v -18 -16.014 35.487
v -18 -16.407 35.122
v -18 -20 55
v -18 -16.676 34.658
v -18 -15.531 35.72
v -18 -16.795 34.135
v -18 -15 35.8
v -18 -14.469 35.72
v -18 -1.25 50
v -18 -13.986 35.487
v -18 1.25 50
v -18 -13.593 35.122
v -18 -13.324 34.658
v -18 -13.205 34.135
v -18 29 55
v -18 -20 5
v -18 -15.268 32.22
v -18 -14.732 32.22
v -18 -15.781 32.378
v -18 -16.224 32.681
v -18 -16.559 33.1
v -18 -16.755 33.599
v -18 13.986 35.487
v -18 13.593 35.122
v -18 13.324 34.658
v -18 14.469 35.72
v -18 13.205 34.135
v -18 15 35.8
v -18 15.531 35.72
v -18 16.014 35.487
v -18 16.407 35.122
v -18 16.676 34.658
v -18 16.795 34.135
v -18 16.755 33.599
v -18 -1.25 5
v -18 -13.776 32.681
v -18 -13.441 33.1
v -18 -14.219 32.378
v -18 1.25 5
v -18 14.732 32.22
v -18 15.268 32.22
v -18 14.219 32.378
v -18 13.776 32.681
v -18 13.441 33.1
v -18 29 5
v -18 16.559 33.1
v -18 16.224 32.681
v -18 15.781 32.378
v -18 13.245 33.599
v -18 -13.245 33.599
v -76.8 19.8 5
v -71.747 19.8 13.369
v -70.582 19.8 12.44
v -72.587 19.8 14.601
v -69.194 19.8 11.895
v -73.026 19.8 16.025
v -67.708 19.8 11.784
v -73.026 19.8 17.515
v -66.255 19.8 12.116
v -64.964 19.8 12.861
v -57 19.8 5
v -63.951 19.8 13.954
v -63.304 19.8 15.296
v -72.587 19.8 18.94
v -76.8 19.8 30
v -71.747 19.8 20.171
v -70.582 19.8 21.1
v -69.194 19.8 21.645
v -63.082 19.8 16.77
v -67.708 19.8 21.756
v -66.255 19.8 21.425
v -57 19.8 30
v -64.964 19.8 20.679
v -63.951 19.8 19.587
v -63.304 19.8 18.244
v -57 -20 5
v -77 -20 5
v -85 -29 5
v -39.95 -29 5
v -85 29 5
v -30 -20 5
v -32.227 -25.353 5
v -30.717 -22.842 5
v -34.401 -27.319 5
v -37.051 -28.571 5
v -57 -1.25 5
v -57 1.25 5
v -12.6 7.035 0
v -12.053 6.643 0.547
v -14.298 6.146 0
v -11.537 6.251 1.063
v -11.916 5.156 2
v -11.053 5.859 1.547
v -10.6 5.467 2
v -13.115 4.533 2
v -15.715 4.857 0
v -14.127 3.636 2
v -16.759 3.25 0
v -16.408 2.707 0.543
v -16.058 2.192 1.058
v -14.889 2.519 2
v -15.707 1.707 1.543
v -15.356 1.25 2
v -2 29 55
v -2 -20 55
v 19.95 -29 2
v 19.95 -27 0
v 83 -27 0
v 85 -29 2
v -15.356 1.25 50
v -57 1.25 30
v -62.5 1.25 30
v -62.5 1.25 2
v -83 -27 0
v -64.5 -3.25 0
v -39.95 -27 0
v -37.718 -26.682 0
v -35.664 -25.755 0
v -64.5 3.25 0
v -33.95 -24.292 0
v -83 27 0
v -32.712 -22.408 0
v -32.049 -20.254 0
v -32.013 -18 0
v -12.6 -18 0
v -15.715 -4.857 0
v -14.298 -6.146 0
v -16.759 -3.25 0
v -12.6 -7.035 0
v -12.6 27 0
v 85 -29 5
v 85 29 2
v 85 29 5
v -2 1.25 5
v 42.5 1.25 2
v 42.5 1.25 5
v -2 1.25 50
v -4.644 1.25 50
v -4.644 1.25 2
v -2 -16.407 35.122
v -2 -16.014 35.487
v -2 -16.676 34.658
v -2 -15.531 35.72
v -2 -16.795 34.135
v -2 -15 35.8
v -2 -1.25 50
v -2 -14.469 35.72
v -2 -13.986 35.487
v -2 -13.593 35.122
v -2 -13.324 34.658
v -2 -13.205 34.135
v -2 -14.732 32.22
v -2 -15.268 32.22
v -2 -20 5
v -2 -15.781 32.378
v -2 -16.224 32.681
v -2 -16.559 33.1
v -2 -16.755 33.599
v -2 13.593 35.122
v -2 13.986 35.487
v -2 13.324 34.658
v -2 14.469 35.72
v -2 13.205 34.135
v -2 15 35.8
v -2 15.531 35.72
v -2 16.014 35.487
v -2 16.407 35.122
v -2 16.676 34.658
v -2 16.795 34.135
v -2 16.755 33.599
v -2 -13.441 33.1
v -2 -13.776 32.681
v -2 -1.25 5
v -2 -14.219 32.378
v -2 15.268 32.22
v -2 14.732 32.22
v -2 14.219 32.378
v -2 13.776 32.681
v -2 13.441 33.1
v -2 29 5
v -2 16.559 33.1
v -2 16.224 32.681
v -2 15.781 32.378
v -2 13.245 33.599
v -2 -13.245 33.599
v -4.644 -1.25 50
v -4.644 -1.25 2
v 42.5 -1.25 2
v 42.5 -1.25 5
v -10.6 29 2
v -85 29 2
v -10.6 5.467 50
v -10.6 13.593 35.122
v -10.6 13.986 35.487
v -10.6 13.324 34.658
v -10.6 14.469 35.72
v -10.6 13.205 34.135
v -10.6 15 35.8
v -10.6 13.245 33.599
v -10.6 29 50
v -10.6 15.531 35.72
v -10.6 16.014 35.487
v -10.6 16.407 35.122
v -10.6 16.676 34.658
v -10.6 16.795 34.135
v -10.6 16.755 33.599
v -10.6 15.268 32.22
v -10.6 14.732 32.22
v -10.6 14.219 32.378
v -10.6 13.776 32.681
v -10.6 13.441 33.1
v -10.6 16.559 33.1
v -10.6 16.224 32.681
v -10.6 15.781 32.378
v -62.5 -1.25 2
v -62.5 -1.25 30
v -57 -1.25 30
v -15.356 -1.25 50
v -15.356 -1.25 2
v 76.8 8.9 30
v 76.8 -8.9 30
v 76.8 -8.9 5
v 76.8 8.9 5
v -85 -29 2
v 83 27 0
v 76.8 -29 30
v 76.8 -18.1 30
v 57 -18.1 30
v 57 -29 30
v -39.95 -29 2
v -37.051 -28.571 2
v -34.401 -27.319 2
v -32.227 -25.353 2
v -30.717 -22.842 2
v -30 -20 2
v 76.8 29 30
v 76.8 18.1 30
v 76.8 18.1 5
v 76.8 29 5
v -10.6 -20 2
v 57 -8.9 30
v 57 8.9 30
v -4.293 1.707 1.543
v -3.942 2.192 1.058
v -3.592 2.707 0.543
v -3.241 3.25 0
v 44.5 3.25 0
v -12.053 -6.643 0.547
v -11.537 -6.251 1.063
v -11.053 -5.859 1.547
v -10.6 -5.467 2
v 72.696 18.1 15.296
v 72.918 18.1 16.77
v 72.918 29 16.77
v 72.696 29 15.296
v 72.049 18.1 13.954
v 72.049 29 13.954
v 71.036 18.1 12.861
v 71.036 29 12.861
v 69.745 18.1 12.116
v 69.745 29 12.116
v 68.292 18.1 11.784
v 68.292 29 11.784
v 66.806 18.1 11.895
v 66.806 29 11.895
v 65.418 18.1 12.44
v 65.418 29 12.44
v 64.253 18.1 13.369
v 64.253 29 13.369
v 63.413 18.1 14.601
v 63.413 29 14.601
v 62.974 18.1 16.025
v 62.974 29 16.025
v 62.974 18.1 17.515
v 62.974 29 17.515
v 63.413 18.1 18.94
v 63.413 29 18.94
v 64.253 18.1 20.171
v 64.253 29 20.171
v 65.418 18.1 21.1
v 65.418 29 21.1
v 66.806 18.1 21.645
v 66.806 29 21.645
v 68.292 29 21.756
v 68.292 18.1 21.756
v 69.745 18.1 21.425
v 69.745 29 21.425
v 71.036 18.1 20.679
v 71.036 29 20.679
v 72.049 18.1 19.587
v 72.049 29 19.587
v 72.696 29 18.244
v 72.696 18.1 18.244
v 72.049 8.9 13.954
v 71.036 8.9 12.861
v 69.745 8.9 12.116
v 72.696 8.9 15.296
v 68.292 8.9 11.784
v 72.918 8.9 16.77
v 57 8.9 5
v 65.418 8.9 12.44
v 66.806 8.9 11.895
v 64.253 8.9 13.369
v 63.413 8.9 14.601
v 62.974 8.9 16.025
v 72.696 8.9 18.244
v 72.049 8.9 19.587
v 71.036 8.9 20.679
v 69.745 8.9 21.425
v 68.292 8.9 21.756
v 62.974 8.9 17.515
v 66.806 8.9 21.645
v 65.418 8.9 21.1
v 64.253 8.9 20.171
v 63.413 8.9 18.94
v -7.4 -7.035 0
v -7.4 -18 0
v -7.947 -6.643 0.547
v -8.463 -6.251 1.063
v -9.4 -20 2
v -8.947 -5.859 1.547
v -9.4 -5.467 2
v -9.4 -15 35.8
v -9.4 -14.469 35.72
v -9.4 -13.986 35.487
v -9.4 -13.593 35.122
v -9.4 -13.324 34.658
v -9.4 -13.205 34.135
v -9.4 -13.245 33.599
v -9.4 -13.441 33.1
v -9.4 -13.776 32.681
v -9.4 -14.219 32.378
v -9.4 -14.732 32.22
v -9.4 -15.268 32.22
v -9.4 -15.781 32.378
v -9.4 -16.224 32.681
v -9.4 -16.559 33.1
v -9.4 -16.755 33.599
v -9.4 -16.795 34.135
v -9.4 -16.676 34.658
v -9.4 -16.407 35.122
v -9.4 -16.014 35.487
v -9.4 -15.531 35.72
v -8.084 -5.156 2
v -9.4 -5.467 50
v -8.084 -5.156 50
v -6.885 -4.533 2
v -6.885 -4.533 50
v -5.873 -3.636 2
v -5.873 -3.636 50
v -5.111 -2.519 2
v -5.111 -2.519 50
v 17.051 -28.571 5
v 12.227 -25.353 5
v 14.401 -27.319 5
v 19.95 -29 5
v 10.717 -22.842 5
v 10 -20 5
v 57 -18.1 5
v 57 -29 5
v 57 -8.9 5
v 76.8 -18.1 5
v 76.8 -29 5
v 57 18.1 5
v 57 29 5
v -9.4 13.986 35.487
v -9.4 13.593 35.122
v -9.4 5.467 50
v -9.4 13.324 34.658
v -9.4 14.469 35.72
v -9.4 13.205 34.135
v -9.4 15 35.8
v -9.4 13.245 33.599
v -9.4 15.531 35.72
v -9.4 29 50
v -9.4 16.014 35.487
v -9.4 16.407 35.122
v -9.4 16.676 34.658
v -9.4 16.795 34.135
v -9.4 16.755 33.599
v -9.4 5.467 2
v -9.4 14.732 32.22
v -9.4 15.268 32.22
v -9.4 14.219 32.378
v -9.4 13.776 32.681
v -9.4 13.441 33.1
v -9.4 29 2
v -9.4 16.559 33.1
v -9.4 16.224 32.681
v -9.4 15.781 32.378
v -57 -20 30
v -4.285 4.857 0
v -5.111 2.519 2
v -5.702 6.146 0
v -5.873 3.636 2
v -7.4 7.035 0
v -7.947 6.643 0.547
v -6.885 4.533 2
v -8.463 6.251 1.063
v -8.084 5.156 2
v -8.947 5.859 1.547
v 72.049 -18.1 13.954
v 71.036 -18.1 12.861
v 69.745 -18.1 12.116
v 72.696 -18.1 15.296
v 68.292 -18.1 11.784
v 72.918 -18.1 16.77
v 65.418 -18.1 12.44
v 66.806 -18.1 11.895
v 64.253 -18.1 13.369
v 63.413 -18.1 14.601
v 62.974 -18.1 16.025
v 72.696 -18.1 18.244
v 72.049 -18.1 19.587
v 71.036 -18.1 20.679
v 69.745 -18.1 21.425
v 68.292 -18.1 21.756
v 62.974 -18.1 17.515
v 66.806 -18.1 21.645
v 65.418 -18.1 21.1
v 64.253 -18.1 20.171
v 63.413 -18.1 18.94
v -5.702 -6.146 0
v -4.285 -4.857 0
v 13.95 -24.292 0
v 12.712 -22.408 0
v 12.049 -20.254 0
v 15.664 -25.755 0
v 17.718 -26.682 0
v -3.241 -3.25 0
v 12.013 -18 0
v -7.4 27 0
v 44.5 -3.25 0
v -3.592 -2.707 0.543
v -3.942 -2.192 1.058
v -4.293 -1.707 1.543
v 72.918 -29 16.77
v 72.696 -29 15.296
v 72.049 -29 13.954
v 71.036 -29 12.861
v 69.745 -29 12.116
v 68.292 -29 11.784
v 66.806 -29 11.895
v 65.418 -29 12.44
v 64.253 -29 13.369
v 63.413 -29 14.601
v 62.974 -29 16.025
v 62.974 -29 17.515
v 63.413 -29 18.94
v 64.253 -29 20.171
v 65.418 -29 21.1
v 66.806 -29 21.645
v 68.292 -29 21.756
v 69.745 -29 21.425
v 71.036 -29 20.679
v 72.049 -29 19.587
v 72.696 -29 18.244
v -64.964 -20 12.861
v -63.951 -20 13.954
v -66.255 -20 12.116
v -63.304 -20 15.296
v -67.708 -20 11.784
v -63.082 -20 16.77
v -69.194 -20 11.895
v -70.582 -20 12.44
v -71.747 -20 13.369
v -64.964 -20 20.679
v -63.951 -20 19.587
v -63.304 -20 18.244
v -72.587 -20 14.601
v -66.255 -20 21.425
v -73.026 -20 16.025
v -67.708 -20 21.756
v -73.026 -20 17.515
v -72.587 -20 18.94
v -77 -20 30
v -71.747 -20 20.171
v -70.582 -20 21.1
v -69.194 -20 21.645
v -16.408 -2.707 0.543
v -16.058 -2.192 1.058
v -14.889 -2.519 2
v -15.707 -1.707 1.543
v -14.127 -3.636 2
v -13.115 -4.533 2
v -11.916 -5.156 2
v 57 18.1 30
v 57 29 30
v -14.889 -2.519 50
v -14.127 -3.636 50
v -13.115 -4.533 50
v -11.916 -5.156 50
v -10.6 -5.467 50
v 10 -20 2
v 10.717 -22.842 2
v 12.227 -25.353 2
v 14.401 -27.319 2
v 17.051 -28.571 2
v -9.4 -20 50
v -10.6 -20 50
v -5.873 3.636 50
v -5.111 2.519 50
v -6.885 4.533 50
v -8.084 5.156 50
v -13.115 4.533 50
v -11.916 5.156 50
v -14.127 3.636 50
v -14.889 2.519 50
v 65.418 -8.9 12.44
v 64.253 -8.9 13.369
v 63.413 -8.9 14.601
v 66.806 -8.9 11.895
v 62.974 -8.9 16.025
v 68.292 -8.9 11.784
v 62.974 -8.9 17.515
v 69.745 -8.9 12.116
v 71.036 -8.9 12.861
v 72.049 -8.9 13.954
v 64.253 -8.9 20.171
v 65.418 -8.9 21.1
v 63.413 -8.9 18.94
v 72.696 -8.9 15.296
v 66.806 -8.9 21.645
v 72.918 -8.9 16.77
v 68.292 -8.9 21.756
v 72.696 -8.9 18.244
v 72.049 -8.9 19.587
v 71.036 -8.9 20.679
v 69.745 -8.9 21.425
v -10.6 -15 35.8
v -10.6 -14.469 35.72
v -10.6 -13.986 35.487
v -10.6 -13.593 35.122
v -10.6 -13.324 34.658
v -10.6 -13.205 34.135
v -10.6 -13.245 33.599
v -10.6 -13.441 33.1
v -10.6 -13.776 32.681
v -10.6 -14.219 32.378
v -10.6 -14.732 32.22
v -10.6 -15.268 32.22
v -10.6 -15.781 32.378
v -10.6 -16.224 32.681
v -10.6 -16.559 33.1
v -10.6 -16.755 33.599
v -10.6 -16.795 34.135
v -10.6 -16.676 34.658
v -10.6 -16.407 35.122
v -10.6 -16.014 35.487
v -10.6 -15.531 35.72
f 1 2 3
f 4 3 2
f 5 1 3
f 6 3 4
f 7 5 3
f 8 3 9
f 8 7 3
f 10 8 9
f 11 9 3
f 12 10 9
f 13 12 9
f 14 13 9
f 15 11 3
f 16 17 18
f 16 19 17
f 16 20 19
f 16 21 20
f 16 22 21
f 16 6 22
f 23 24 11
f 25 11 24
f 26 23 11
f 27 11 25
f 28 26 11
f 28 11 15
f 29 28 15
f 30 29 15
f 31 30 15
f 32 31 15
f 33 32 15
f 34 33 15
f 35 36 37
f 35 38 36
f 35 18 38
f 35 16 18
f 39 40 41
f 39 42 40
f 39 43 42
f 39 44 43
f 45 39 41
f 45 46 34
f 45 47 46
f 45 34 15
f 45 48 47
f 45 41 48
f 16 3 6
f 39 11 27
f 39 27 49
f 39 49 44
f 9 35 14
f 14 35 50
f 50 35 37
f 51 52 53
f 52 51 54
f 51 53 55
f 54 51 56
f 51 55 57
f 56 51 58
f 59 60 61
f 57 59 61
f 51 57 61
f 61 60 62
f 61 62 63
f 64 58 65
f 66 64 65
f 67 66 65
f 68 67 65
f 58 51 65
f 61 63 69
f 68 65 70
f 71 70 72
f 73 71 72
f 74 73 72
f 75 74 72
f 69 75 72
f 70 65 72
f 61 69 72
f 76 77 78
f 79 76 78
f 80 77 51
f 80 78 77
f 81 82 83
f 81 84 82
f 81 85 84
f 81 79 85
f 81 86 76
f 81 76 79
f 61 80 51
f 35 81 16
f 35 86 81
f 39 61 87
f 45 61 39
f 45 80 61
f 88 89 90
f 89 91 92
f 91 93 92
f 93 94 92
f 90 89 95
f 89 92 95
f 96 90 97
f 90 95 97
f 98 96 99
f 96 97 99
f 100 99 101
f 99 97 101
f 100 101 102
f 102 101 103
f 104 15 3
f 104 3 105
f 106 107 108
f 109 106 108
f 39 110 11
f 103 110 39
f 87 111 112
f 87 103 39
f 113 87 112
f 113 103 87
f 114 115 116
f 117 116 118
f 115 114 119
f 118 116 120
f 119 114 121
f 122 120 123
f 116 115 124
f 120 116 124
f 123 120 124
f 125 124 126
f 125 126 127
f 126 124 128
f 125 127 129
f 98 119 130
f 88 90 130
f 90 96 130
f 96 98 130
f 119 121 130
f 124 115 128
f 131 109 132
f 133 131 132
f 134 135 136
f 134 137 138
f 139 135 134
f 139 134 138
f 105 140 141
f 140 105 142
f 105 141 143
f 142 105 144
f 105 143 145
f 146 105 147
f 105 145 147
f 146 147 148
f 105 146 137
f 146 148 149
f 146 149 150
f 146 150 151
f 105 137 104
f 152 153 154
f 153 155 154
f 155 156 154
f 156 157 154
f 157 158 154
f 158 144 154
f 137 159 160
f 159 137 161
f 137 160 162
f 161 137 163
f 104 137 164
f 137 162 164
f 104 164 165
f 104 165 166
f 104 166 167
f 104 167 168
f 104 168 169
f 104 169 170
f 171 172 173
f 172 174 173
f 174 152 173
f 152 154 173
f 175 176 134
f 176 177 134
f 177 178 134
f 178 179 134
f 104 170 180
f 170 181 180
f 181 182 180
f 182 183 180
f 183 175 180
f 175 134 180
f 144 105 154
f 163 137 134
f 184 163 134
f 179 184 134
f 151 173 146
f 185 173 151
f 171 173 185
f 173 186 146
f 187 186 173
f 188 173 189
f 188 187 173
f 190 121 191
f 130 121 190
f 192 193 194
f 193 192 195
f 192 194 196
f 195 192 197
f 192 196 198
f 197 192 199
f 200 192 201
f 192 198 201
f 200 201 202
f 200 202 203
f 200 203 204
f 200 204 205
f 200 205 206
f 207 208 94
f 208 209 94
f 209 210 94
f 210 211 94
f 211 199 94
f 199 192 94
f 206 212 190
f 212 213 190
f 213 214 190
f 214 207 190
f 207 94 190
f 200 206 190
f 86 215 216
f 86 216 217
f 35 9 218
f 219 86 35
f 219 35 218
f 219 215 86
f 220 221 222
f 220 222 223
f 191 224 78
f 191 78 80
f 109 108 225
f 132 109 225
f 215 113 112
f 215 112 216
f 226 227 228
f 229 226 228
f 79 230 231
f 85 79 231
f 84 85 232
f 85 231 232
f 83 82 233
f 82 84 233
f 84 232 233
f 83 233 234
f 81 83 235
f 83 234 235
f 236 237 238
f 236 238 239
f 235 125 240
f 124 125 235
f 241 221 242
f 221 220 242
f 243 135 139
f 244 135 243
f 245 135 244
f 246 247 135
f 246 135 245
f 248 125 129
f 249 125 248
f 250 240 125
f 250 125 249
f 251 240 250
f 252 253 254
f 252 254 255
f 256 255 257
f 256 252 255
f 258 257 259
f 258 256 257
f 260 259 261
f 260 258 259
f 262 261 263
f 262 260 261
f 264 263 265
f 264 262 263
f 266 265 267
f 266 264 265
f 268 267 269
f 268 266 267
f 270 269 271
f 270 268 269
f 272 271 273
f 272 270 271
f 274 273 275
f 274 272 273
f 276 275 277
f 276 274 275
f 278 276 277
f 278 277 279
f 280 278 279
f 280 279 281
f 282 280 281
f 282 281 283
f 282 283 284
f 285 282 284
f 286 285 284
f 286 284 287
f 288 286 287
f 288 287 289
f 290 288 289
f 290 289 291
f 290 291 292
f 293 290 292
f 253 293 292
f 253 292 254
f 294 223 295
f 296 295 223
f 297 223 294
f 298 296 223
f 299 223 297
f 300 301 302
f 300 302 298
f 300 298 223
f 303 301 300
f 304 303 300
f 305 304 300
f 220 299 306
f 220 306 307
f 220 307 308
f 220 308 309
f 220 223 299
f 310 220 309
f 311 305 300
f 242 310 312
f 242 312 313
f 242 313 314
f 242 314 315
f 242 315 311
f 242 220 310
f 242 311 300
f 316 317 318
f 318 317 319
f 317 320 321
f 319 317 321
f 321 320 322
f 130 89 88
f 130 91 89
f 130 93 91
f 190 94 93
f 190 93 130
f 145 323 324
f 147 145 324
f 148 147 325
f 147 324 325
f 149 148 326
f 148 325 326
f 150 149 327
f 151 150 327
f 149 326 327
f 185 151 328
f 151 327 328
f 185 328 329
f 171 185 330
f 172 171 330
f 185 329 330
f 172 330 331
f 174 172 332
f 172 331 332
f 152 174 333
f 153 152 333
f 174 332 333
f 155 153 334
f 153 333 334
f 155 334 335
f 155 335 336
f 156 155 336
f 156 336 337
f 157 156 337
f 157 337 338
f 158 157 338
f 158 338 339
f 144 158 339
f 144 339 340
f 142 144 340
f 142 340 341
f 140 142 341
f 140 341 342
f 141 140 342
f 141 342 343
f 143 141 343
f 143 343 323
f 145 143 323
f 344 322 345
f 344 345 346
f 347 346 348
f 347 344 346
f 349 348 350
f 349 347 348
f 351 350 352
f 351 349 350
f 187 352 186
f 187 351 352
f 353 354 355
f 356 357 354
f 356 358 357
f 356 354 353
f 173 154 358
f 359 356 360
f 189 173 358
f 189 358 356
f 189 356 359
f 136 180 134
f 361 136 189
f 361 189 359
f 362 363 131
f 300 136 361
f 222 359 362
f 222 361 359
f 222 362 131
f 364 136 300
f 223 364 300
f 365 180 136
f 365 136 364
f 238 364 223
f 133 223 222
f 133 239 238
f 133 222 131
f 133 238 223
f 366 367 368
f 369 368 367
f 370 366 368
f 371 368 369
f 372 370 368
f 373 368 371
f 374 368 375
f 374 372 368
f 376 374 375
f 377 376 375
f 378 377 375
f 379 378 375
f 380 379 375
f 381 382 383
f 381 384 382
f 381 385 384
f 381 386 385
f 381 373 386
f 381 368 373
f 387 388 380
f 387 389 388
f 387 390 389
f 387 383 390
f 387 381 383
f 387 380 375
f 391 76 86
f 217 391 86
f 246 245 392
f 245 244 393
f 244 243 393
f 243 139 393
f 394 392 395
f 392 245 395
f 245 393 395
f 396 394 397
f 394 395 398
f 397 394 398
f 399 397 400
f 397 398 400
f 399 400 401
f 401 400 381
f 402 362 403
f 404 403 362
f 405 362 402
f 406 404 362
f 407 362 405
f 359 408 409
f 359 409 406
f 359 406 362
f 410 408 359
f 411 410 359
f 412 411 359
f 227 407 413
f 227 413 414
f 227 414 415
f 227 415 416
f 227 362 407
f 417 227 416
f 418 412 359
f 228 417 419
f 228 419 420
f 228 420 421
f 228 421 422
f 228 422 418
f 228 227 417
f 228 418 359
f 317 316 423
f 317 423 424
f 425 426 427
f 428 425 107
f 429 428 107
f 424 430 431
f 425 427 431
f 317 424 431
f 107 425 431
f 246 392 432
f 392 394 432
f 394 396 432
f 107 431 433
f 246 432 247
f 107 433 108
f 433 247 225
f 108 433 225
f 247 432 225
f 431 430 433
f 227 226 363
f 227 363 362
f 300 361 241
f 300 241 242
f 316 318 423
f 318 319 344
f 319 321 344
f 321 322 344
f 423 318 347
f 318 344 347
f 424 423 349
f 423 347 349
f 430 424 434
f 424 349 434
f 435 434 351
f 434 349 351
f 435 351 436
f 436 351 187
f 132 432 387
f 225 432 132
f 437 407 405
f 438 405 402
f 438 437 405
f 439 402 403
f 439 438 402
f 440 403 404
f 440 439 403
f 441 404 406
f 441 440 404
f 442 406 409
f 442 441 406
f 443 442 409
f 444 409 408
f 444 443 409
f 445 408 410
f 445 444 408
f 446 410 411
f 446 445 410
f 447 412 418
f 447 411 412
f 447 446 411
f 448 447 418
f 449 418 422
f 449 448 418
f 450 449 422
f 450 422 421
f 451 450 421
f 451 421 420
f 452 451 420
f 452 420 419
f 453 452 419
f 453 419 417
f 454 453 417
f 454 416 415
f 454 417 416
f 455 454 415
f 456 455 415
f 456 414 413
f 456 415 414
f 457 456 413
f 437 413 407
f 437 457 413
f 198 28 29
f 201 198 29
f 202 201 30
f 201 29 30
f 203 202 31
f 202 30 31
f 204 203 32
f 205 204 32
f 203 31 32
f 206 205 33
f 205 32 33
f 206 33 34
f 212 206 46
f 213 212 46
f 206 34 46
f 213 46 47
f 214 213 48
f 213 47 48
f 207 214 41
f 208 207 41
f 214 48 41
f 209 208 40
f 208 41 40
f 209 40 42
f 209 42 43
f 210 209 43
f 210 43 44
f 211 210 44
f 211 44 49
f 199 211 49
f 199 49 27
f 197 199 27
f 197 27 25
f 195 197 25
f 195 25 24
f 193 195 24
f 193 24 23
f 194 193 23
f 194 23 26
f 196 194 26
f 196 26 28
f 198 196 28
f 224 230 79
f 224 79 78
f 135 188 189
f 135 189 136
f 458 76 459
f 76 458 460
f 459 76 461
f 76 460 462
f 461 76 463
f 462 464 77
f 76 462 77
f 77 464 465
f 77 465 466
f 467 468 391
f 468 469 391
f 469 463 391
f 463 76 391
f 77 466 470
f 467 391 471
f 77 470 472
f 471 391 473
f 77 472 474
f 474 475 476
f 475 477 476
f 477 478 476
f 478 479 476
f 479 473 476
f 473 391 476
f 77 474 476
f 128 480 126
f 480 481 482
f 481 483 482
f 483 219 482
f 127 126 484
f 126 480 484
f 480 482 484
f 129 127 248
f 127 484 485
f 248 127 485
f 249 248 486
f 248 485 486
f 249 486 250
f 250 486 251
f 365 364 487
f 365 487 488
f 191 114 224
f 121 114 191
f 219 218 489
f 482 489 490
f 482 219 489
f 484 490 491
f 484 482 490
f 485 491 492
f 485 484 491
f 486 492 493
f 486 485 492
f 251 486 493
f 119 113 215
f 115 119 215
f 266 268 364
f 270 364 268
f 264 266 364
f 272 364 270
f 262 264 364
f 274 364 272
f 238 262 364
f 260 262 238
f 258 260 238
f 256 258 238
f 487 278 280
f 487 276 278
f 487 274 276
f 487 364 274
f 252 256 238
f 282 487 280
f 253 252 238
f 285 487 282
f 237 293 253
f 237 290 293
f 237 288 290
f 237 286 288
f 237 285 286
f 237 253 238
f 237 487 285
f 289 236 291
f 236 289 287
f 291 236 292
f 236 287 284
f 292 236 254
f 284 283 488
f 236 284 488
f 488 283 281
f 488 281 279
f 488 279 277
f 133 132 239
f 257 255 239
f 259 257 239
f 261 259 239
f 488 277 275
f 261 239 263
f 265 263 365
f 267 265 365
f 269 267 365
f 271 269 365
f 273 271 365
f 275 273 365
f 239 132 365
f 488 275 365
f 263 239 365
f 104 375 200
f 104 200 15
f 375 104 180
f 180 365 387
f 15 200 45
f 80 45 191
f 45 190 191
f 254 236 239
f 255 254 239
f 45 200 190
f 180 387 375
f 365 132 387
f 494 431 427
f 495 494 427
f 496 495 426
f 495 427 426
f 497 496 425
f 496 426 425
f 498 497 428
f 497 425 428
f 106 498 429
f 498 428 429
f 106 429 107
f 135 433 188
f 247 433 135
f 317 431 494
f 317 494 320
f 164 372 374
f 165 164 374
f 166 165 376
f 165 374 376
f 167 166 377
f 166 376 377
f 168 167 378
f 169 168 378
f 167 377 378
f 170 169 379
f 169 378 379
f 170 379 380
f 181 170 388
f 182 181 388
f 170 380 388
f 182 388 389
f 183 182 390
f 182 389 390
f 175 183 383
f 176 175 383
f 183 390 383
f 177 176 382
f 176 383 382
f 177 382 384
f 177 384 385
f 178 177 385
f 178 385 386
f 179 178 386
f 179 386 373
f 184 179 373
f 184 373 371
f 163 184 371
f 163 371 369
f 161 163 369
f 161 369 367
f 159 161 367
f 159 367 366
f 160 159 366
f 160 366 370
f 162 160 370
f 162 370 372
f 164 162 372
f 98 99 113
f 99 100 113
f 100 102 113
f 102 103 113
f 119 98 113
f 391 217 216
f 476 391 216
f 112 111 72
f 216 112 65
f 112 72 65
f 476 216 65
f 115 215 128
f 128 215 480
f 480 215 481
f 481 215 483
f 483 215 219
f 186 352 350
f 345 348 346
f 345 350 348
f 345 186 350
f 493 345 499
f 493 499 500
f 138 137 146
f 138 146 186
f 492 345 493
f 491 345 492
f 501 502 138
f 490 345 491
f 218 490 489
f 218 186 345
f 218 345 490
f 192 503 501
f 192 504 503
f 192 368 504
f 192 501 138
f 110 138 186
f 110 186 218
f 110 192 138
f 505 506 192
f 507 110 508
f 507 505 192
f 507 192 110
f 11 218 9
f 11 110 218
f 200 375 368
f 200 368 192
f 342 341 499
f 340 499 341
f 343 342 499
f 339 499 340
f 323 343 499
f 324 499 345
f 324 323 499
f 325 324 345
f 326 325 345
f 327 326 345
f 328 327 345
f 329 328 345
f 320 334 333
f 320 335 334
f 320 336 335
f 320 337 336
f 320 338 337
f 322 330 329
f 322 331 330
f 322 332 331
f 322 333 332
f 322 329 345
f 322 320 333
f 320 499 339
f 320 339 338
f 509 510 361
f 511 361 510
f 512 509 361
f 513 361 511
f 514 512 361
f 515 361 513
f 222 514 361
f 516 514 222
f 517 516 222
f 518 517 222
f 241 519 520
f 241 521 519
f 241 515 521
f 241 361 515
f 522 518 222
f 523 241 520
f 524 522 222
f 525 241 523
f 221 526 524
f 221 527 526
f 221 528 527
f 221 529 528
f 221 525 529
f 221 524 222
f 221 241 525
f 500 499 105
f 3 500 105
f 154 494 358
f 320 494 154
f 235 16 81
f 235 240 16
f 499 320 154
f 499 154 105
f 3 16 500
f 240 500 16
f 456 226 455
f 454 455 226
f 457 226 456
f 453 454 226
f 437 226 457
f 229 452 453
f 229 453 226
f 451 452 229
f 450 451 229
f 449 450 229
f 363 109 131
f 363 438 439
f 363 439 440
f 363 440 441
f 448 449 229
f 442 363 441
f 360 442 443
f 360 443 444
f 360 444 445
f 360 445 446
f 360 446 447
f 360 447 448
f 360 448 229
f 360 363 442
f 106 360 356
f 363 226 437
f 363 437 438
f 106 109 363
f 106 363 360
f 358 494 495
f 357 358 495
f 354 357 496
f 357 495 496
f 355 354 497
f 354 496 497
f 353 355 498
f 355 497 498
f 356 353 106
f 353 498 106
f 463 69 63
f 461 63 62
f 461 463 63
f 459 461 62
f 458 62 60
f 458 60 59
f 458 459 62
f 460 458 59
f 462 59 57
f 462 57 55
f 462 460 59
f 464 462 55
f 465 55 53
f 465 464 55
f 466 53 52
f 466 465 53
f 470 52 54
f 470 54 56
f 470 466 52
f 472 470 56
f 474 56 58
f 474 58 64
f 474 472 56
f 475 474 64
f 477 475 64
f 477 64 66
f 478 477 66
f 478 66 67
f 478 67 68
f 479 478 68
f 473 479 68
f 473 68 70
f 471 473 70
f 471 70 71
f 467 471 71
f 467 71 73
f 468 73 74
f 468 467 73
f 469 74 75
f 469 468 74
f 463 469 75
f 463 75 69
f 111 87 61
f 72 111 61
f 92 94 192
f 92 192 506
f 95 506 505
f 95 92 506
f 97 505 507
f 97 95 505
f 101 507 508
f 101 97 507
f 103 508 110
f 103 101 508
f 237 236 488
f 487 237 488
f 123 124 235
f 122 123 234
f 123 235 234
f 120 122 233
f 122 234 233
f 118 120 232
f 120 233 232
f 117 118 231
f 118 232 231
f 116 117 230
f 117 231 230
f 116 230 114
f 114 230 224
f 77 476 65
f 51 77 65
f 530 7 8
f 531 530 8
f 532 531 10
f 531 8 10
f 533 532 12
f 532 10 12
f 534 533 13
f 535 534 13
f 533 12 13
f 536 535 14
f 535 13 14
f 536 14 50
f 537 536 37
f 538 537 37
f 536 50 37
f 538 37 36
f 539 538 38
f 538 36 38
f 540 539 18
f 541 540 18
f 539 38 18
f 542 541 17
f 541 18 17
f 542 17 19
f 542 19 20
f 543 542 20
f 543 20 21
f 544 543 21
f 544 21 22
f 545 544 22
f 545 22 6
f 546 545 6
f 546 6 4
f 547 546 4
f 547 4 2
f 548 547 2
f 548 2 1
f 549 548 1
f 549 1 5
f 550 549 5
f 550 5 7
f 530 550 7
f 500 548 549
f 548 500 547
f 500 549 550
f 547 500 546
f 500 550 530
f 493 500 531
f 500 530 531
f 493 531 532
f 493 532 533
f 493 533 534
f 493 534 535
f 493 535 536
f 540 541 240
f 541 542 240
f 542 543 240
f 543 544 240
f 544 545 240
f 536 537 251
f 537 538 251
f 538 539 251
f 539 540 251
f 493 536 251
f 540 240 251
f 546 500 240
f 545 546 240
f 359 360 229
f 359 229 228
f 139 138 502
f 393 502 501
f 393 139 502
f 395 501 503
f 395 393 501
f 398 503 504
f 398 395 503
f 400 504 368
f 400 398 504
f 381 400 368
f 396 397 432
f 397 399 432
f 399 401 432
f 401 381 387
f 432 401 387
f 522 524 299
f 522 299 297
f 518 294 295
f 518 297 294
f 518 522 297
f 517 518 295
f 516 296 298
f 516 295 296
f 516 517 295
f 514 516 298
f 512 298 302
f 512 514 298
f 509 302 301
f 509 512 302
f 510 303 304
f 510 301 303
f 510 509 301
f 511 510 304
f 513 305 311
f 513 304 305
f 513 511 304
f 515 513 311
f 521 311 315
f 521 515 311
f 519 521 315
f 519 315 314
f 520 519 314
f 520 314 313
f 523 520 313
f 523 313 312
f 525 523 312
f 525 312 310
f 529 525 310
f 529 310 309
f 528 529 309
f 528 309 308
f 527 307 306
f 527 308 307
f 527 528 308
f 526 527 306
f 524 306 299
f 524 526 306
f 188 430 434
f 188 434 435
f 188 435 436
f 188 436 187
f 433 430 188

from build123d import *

# Parameters (mm, degrees)
SKETCH1_W           = 170
SKETCH1_H           = 58
BOSS_EXTRUDE1_DEPTH = 5
SKETCH2_W           = 28
SKETCH2_H           = 58
BOSS_EXTRUDE2_DEPTH = 25
CUT_EXTRUDE4_DEPTH  = 25
SKETCH6_W           = 16
SKETCH6_H           = 58
BOSS_EXTRUDE3_DEPTH = 50
SKETCH7_W           = 1.2
SKETCH7_H           = 58
CUT_EXTRUDE5_DEPTH  = 50
CUT_EXTRUDE6_DEPTH  = 50
SKETCH9_R           = 1.8
CUT_EXTRUDE7_DEPTH  = 20
HOLE3_START         = -20
HOLE3_OUTLINE_R     = 5
HOLE3_DEPTH         = 39.8
HOLE4_START         = -29
HOLE4_OUTLINE_R     = 5
HOLE4_DEPTH         = 58
SKETCH12_W          = 40
SKETCH12_H          = 9
CUT_EXTRUDE8_DEPTH  = 106.313816757
FILLET1_R           = 10
CHAMFER1_SIZE       = 2


# Read off the part's stored shape, not the designer's step: Hole3, Hole4
with BuildPart() as part:
    # Sketch1 → Boss-Extrude1 (new body)
    with BuildSketch(Plane.XY):
        Rectangle(SKETCH1_W, SKETCH1_H)
    extrude(amount=BOSS_EXTRUDE1_DEPTH)

    # Sketch2 → Boss-Extrude2 (add)
    with BuildSketch(Plane(origin=(0, 0, 5), x_dir=(-1, 0, 0), z_dir=(0, 0, -1))):
        with Locations((71, 0)):
            Rectangle(SKETCH2_W, SKETCH2_H)
        with Locations((-71, 0)):
            Rectangle(SKETCH2_W, SKETCH2_H)
    extrude(amount=-BOSS_EXTRUDE2_DEPTH)

    # Sketch3 → Cut-Extrude4 (cut)
    with BuildSketch(Plane.XY.offset(30)):
        Polygon((-57, -29), (-57, -20), (-77, -20), (-76.8, 19.8), (-57, 19.8), (-57, 29), (-85, 29), (-85, -29), align=None)
        Polygon((56, 8.9), (56, 18.1), (76.8, 18.1), (76.8, 29), (85, 29), (85, -29), (76.8, -29), (76.8, -18.1), (56, -18.1), (56, -8.9), (76.8, -8.9), (76.8, 8.9), align=None)
    extrude(amount=-CUT_EXTRUDE4_DEPTH, mode=Mode.SUBTRACT)

    # Sketch6 → Boss-Extrude3 (add)
    with BuildSketch(Plane.XY.offset(5)):
        with Locations((-10, 0)):
            Rectangle(SKETCH6_W, SKETCH6_H)
    extrude(amount=BOSS_EXTRUDE3_DEPTH)

    # Sketch7 → Cut-Extrude5 (cut)
    with BuildSketch(Plane(origin=(0, 0, 0), x_dir=(-1, 0, 0), z_dir=(0, 0, -1))):
        with Locations((10, 0)):
            Rectangle(SKETCH7_W, SKETCH7_H)
    extrude(amount=-CUT_EXTRUDE5_DEPTH, mode=Mode.SUBTRACT)

    # Sketch8 → Cut-Extrude6 (cut)
    with BuildSketch(Plane(origin=(0, 0, 0), x_dir=(-1, 0, 0), z_dir=(0, 0, -1))):
        with BuildLine():
            Line((15.356071321, 1.25), (62.5, 1.25))
            Line((62.5, 1.25), (62.5, -1.25))
            Line((62.5, -1.25), (15.356071321, -1.25))
            ThreePointArc((15.356071321, -1.25), (10, -5.5), (4.643928679, -1.25))
            Line((4.643928679, -1.25), (-42.5, -1.25))
            Line((-42.5, -1.25), (-42.5, 1.25))
            Line((-42.5, 1.25), (4.643928679, 1.25))
            ThreePointArc((4.643928679, 1.25), (10, 5.5), (15.356071321, 1.25))
        make_face()
    extrude(amount=-CUT_EXTRUDE6_DEPTH, mode=Mode.SUBTRACT)

    # Sketch9 → Cut-Extrude7 (cut)
    with BuildSketch(Plane.ZY.offset(18)):
        with Locations((34, 15)):
            Circle(SKETCH9_R)
        with Locations((34, -15)):
            Circle(SKETCH9_R)
    extrude(amount=-CUT_EXTRUDE7_DEPTH, mode=Mode.SUBTRACT)

    # Hole3 outline → Hole3 (cut)
    with BuildSketch(Plane(origin=(0, 0, 0), x_dir=(1, 0, 0), z_dir=(0, 1, 0)).offset(HOLE3_START)):
        with Locations((-68.081865543, -16.770132162)):
            Circle(HOLE3_OUTLINE_R)
    extrude(amount=HOLE3_DEPTH, mode=Mode.SUBTRACT)

    # Hole4 outline → Hole4 (cut)
    with BuildSketch(Plane(origin=(0, 0, 0), x_dir=(1, 0, 0), z_dir=(0, 1, 0)).offset(HOLE4_START)):
        with Locations((67.918134457, -16.770132162)):
            Circle(HOLE4_OUTLINE_R)
    extrude(amount=HOLE4_DEPTH, mode=Mode.SUBTRACT)

    # Sketch12 → Cut-Extrude8 (cut, through all)
    with BuildSketch(Plane(origin=(0, 0, 0), x_dir=(-1, 0, 0), z_dir=(0, 0, -1))):
        with Locations((10, -24.5)):
            Rectangle(SKETCH12_W, SKETCH12_H)
    extrude(amount=-CUT_EXTRUDE8_DEPTH, mode=Mode.SUBTRACT)

    # Fillet1
    # the kernel refuses this fillet: 10 mm, written as the material it takes off along each edge
    with BuildSketch(Plane(origin=(-30, -29, -24.874685928), x_dir=(0, 1, 0), z_dir=(0, 0, 1))) as fillet1_piece_1:
        with BuildLine():
            CenterArc((10, 9.949874371), FILLET1_R, 180, 84.260829523)
            Line((0, 9.949874371), (-0.2, 9.949874371))
            Line((-0.2, 9.949874371), (-0.2, 0))
            Line((-0.2, 0), (0, -0.2))
            ThreePointArc((0, -0.2), (4.5, -0.2), (8.98, -0.198997487))
            Line((8.98, -0.198997487), (9, 0))
        make_face()
    extrude(amount=54.749371855, mode=Mode.SUBTRACT)
    with BuildSketch(Plane(origin=(10, -29, -24.874685928), x_dir=(0, 1, 0), z_dir=(0, 0, 1))) as fillet1_piece_2:
        with BuildLine():
            CenterArc((10, -9.949874371), FILLET1_R, 95.739170477, 84.260829523)
            Line((0, -9.949874371), (-0.2, -9.949874371))
            Line((-0.2, -9.949874371), (-0.2, 0))
            Line((-0.2, 0), (0, 0.2))
            ThreePointArc((0, 0.2), (4.5, 0.2), (8.98, 0.198997487))
            Line((8.98, 0.198997487), (9, 0))
        make_face()
    extrude(amount=54.749371855, mode=Mode.SUBTRACT)

    # Chamfer1
    chamfer1_edges = [part.edges().sort_by_distance(p)[0] for p in [
        (-47.8, 29, 0),
        (-9.4, 17.233587387, 0),
        (-10.6, 17.233587387, 0),
        (-9.4, -12.733587387, 0),
        (-6.351049855, -4.115235453, 0),
        (-6.351049855, 4.115235453, 0),
        (18.928035661, 1.25, 0),
        (42.5, 0, 0),
        (18.928035661, -1.25, 0),
        (-13.648950145, 4.115235453, 0),
        (-13.648950145, -4.115235453, 0),
        (-38.928035661, -1.25, 0),
        (-62.5, 0, 0),
        (-38.928035661, 1.25, 0),
        (-10.6, -12.733587387, 0),
        (0.3, -20, 0),
        (-20.3, -20, 0),
        (-33.241670439, -26.416198487, 0),
        (52.474937186, -29, 0),
        (13.241670439, -26.416198487, 0),
        (37.8, 29, 0),
        (85, 0, 0),
        (-62.474937186, -29, 0),
        (-85, 0, 0),
    ]]
    chamfer(chamfer1_edges, length=CHAMFER1_SIZE)


solid = part.part
